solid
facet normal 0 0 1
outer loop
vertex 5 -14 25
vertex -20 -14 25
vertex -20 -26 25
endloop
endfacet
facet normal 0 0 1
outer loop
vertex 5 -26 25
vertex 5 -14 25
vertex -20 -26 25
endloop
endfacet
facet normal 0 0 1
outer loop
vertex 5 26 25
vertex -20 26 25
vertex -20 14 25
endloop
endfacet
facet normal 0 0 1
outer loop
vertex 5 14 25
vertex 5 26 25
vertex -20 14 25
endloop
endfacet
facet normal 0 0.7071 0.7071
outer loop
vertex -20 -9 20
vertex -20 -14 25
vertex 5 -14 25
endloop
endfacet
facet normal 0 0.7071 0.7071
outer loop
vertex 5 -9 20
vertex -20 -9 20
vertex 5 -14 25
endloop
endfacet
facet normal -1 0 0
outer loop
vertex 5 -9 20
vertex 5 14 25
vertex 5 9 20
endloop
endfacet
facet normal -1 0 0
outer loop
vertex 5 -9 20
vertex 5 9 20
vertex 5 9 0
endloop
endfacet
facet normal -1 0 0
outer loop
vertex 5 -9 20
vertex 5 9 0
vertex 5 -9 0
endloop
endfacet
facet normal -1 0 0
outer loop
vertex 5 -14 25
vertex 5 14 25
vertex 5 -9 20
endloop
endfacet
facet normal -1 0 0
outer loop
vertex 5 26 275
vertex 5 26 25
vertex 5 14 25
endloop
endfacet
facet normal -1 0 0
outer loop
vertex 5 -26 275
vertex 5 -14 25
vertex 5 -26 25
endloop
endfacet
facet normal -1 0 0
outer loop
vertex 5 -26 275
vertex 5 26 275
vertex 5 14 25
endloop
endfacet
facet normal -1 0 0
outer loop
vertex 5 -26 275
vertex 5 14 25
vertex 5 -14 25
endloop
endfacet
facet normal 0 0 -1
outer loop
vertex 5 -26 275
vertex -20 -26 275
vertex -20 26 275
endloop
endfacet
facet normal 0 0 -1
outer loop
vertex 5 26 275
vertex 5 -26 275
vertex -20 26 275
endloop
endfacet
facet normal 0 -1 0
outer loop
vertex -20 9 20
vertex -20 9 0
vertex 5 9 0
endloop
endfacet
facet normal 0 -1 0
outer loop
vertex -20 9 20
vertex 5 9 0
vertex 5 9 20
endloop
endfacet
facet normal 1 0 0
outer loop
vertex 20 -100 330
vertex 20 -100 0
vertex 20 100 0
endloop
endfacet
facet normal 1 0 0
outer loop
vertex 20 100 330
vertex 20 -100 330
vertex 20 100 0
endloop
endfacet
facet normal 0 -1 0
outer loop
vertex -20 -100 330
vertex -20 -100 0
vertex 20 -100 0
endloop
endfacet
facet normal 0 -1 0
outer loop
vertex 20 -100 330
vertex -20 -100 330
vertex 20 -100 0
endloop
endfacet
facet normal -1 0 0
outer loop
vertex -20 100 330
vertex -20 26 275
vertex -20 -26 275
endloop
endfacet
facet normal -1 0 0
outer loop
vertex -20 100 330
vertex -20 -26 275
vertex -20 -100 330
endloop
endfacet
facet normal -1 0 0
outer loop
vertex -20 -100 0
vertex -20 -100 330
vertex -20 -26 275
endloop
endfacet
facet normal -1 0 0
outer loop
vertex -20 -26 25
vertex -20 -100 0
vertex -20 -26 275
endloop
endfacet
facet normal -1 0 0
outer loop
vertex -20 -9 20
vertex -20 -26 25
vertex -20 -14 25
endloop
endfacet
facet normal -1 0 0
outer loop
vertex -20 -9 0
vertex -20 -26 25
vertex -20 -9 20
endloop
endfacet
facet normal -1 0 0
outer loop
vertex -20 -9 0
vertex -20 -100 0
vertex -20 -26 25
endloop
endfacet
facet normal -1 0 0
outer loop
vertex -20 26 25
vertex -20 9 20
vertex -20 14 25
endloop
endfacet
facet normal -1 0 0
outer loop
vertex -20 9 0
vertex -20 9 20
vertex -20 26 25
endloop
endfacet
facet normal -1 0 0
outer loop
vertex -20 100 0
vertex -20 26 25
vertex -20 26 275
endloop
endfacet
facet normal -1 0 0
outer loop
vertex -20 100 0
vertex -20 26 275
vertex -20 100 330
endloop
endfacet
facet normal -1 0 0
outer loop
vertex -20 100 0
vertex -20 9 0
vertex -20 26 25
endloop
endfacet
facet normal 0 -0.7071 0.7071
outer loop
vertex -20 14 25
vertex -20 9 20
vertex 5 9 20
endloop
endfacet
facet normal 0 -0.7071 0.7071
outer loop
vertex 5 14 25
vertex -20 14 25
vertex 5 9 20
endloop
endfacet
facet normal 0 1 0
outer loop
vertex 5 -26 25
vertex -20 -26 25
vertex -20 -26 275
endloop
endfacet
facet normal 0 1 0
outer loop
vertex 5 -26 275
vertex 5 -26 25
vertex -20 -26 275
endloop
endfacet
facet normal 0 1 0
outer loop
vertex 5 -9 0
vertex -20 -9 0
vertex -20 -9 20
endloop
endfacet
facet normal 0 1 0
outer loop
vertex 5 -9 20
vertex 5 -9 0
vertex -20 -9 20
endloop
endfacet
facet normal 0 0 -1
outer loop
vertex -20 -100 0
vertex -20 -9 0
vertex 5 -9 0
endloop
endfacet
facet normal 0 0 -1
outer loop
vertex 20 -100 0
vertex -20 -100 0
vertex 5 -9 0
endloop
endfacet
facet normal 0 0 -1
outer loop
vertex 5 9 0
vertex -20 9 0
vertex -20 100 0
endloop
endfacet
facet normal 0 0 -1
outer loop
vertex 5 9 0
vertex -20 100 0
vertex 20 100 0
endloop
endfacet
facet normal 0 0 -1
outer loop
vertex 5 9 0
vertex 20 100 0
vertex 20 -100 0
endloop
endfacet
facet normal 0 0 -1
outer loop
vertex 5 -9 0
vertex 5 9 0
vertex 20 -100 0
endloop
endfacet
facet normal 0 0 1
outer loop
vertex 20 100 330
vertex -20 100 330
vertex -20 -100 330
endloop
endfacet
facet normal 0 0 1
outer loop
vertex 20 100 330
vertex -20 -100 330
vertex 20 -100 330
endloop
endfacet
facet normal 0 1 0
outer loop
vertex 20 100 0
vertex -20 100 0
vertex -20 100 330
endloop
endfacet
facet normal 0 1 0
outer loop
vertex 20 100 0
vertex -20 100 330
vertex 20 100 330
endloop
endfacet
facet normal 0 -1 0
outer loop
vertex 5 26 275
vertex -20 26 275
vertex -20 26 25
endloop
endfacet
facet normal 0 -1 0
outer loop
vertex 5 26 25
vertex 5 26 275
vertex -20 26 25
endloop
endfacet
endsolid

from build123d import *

# Parameters (mm, degrees)
F0_W     = 40
F0_H     = 200
F1_DEPTH = 330
F2_W     = 9
F2_H     = 25
F3_DEPTH = 25
F4_SIZE  = 5


with BuildPart() as f1:
    # F0 (on Top) → F1 (new body)
    with BuildSketch(Plane.XY):
        Rectangle(F0_W, F0_H)
    extrude(amount=F1_DEPTH)

    # F2 (on face) → F3 (cut)
    with BuildSketch(Plane(origin=(-20, 0, 0), x_dir=(0, -1, 0), z_dir=(-1, 0, 0))):
        Polygon((9, 25), (26, 25), (26, 275), (-26, 275), (-26, 25), (-9, 25), (0, 25), align=None)
        with Locations((4.5, 12.5)):
            Rectangle(F2_W, F2_H)
        with Locations((-4.5, 12.5)):
            Rectangle(F2_W, F2_H)
    extrude(amount=-F3_DEPTH, mode=Mode.SUBTRACT)

    # F4
    f4_edges = [f1.edges().sort_by_distance(p)[0] for p in [
        (-7.5, 9, 25),
        (-7.5, -9, 25),
    ]]
    chamfer(f4_edges, length=F4_SIZE)


solid = f1.part
